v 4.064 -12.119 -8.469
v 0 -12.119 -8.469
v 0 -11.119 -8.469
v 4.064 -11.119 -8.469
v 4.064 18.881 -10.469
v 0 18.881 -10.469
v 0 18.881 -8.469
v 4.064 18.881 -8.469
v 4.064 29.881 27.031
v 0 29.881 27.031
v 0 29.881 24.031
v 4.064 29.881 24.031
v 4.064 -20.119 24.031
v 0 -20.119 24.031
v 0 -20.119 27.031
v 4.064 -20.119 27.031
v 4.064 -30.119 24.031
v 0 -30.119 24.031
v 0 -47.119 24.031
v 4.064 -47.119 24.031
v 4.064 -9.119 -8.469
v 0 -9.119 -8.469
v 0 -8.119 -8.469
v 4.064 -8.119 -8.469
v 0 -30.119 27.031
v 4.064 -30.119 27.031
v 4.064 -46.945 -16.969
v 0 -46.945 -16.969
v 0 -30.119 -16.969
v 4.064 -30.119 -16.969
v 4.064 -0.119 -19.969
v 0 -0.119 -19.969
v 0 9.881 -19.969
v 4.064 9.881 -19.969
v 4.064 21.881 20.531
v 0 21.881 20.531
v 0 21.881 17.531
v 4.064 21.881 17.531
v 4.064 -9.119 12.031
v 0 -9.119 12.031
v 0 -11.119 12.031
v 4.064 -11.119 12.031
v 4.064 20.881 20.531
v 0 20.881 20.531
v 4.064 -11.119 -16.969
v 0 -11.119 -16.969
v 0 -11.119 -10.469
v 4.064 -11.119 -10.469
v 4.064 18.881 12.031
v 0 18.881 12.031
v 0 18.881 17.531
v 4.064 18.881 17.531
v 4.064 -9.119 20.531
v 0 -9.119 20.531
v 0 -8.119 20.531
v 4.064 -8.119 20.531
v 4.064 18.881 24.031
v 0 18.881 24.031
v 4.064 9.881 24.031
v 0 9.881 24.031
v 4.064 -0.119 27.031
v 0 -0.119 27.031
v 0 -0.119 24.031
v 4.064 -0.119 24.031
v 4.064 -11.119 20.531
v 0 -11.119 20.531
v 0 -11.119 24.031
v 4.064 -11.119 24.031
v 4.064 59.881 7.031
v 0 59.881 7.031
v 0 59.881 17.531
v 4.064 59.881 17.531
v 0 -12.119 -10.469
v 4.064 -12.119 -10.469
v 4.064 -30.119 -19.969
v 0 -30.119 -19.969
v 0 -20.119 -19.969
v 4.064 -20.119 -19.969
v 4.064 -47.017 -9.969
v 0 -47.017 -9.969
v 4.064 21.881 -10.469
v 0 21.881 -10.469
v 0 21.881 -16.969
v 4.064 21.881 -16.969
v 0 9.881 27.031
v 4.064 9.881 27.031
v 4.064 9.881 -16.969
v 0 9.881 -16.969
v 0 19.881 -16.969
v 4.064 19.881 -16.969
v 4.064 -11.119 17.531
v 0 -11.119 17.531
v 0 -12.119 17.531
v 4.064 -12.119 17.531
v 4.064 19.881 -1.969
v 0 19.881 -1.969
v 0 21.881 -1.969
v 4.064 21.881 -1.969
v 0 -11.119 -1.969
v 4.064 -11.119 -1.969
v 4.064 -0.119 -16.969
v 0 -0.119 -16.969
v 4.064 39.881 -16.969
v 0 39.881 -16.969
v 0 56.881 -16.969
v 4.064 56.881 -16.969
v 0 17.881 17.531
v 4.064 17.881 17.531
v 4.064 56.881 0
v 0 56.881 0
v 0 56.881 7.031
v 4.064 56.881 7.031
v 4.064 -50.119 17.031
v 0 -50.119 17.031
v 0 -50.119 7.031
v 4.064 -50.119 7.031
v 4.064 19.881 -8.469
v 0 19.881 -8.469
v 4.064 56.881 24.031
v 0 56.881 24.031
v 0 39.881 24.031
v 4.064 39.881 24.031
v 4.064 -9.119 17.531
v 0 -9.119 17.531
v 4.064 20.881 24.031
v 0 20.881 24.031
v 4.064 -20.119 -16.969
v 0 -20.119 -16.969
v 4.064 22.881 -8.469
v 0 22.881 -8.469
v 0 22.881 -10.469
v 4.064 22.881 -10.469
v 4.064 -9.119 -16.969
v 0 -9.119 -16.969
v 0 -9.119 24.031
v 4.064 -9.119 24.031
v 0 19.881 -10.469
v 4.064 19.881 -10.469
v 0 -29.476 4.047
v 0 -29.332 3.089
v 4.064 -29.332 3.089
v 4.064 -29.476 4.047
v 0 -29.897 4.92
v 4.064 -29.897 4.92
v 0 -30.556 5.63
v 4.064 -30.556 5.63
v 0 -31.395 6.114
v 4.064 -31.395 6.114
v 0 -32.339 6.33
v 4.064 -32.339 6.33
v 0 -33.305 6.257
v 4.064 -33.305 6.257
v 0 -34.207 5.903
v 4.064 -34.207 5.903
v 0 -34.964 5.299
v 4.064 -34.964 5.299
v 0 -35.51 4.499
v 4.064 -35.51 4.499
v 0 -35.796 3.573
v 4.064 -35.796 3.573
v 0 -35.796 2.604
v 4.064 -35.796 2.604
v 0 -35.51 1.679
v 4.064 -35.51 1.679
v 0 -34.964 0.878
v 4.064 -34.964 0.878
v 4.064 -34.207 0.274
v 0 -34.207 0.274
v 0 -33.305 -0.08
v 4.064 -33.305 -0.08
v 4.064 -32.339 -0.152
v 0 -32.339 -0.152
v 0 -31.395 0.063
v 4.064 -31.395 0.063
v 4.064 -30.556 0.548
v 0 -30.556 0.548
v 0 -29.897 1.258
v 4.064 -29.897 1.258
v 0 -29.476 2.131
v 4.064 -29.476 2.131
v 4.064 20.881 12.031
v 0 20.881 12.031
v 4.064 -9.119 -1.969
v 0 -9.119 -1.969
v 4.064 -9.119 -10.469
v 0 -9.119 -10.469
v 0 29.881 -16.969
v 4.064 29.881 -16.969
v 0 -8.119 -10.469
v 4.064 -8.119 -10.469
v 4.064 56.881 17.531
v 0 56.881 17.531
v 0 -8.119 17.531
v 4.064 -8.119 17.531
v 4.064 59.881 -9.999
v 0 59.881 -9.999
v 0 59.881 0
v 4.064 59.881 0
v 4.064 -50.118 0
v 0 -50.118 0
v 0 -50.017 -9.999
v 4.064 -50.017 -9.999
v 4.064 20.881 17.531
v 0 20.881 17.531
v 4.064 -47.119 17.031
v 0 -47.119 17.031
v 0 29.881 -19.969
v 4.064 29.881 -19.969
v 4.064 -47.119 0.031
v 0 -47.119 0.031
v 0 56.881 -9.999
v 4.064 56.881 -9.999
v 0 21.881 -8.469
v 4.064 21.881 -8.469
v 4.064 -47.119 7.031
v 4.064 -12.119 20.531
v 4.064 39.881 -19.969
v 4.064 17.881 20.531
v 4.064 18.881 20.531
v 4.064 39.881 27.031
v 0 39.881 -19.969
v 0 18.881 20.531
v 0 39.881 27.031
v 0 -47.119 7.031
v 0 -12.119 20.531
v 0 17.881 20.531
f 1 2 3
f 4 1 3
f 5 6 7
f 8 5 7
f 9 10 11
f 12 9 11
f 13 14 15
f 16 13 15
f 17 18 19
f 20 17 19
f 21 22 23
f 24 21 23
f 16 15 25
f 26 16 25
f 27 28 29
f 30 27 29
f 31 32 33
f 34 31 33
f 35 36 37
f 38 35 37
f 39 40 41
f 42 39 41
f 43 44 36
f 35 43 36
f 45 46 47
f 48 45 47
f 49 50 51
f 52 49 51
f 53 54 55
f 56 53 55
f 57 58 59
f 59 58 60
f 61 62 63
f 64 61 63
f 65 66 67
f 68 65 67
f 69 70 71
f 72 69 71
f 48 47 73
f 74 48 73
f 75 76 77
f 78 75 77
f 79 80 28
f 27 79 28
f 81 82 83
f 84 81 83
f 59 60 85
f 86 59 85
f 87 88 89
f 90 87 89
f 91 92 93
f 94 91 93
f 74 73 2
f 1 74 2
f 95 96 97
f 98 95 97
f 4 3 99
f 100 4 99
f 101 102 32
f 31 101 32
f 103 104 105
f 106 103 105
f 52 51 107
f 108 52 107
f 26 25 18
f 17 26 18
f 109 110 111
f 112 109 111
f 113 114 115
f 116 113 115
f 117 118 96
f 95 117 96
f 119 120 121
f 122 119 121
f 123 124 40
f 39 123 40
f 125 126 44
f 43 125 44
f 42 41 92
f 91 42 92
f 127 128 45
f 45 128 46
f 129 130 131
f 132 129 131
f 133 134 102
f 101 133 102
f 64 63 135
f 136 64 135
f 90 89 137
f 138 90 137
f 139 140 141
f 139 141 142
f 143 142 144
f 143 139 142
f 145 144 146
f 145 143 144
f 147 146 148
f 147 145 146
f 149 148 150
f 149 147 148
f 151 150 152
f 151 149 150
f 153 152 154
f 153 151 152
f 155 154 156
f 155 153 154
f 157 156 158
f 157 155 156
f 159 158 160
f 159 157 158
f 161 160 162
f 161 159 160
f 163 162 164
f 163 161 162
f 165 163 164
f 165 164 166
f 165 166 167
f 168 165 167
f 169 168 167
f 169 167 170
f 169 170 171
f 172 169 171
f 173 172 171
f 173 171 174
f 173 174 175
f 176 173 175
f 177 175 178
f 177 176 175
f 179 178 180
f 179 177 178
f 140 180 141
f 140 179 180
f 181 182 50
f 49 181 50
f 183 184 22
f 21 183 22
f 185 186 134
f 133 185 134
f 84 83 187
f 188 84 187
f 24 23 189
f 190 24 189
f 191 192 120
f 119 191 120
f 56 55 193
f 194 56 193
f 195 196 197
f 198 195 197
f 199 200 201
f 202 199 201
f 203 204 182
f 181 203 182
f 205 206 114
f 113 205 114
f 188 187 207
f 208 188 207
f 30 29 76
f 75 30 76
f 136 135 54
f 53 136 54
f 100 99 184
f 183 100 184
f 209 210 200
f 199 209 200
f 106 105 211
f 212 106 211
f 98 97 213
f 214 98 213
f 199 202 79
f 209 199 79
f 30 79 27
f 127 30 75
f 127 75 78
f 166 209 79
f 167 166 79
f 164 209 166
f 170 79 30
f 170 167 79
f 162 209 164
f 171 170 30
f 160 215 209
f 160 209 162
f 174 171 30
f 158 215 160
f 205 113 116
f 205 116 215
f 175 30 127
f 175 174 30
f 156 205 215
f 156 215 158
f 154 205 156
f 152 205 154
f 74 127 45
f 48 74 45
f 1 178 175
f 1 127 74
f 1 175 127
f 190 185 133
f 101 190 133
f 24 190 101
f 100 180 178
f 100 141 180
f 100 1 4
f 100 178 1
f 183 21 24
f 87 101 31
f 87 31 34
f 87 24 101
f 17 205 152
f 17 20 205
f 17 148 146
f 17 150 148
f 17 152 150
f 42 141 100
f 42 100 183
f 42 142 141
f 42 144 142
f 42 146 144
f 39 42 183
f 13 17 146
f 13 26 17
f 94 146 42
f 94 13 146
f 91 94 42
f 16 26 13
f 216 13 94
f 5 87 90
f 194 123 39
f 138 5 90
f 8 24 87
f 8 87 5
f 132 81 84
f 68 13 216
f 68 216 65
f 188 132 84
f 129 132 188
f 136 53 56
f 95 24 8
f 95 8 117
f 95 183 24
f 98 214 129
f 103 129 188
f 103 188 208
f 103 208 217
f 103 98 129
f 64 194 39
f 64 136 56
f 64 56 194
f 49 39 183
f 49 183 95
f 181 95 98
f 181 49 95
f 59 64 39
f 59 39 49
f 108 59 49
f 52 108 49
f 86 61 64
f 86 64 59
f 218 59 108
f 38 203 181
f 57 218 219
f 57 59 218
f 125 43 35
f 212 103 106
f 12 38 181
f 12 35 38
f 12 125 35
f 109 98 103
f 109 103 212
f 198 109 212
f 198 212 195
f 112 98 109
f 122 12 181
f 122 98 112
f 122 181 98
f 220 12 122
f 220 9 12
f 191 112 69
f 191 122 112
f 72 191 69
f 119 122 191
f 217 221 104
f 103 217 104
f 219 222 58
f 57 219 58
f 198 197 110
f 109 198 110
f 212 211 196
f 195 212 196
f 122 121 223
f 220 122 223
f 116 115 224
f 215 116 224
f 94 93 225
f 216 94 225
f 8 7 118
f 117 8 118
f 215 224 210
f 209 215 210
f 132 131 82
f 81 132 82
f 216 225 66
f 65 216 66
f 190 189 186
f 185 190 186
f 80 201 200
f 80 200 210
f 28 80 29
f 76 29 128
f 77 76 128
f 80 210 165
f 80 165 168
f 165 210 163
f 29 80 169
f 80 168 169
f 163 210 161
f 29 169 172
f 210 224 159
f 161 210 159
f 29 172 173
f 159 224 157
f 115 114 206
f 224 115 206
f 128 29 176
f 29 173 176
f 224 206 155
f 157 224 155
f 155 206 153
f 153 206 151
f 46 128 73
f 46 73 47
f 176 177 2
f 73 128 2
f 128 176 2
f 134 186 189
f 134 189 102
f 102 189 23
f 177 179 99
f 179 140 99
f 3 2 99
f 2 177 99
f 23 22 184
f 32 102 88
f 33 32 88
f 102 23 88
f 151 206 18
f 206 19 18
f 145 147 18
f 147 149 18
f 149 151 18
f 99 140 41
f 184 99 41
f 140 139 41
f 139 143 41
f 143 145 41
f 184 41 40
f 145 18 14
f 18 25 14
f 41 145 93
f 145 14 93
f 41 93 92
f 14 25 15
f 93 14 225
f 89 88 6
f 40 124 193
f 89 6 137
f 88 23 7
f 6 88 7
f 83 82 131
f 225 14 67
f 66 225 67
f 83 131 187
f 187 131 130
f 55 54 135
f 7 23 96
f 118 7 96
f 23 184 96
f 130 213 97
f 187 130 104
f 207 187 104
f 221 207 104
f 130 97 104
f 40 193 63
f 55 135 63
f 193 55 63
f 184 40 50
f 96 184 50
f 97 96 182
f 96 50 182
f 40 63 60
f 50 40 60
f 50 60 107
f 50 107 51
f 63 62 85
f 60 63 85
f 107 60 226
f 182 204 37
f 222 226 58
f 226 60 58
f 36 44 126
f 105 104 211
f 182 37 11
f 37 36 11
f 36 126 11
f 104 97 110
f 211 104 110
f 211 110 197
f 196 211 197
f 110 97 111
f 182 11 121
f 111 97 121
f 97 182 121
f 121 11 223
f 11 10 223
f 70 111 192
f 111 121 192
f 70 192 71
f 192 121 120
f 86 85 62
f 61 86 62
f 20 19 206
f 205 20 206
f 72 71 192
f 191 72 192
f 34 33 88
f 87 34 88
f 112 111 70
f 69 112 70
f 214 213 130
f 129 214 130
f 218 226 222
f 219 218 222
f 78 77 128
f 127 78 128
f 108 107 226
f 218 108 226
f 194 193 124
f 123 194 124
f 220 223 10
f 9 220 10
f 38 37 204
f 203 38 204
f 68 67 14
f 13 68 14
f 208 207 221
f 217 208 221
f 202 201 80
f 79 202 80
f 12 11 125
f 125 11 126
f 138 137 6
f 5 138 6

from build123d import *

# Parameters (mm, degrees)
F0_R     = 3.25
F1_DEPTH = 4.064


with BuildPart() as f1:
    # F0 (on Right) → F1 (new body)
    with BuildSketch(Plane.YZ):
        Polygon((-47.118501, 17.030547), (-50.118501, 17.030547), (-50.118501, 7.030547), (-47.118501, 7.030547), (-47.118501, 0.030547), (-50.118346, 0), (-50.016524, -9.999482), (-47.016679, -9.968935), (-46.945404, -16.968572), (-30.118501, -16.968572), (-30.118501, -19.968572), (-20.118501, -19.968572), (-20.118501, -16.968572), (-11.118501, -16.968572), (-11.118501, -10.468572), (-12.118501, -10.468572), (-12.118501, -8.468572), (-11.118501, -8.468572), (-11.118501, -1.968572), (-9.118501, -1.968572), (-9.118501, -8.468572), (-8.118501, -8.468572), (-8.118501, -10.468572), (-9.118501, -10.468572), (-9.118501, -16.968572), (-0.118501, -16.968572), (-0.118501, -19.968572), (9.881499, -19.968572), (9.881499, -16.968572), (19.881499, -16.968572), (19.881499, -10.468572), (18.881499, -10.468572), (18.881499, -8.468572), (19.881499, -8.468572), (19.881499, -1.968572), (21.881499, -1.968572), (21.881499, -8.468572), (22.881499, -8.468572), (22.881499, -10.468572), (21.881499, -10.468572), (21.881499, -16.968572), (29.881499, -16.968572), (29.881499, -19.968572), (39.881499, -19.968572), (39.881499, -16.968572), (56.881499, -16.968572), (56.881499, -9.999482), (59.881499, -9.999482), (59.881499, 0), (56.881499, 0), (56.881499, 7.030547), (59.881499, 7.030547), (59.881499, 17.530547), (56.881499, 17.530547), (56.881499, 24.030547), (39.881499, 24.030547), (39.881499, 27.030547), (29.881499, 27.030547), (29.881499, 24.030547), (20.881499, 24.030547), (20.881499, 20.530547), (21.881499, 20.530547), (21.881499, 17.530547), (20.881499, 17.530547), (20.881499, 12.030547), (18.881499, 12.030547), (18.881499, 17.530547), (17.881499, 17.530547), (17.881499, 20.530547), (18.881499, 20.530547), (18.881499, 24.030547), (9.881499, 24.030547), (9.881499, 27.030547), (-0.118501, 27.030547), (-0.118501, 24.030547), (-9.118501, 24.030547), (-9.118501, 20.530547), (-8.118501, 20.530547), (-8.118501, 17.530547), (-9.118501, 17.530547), (-9.118501, 12.030547), (-11.118501, 12.030547), (-11.118501, 17.530547), (-12.118501, 17.530547), (-12.118501, 20.530547), (-11.118501, 20.530547), (-11.118501, 24.030547), (-20.118501, 24.030547), (-20.118501, 27.030547), (-30.118501, 27.030547), (-30.118501, 24.030547), (-47.118501, 24.030547), align=None)
        with Locations((-32.581907, 3.088805)):
            Circle(F0_R, mode=Mode.SUBTRACT)
    extrude(amount=F1_DEPTH)


solid = f1.part
